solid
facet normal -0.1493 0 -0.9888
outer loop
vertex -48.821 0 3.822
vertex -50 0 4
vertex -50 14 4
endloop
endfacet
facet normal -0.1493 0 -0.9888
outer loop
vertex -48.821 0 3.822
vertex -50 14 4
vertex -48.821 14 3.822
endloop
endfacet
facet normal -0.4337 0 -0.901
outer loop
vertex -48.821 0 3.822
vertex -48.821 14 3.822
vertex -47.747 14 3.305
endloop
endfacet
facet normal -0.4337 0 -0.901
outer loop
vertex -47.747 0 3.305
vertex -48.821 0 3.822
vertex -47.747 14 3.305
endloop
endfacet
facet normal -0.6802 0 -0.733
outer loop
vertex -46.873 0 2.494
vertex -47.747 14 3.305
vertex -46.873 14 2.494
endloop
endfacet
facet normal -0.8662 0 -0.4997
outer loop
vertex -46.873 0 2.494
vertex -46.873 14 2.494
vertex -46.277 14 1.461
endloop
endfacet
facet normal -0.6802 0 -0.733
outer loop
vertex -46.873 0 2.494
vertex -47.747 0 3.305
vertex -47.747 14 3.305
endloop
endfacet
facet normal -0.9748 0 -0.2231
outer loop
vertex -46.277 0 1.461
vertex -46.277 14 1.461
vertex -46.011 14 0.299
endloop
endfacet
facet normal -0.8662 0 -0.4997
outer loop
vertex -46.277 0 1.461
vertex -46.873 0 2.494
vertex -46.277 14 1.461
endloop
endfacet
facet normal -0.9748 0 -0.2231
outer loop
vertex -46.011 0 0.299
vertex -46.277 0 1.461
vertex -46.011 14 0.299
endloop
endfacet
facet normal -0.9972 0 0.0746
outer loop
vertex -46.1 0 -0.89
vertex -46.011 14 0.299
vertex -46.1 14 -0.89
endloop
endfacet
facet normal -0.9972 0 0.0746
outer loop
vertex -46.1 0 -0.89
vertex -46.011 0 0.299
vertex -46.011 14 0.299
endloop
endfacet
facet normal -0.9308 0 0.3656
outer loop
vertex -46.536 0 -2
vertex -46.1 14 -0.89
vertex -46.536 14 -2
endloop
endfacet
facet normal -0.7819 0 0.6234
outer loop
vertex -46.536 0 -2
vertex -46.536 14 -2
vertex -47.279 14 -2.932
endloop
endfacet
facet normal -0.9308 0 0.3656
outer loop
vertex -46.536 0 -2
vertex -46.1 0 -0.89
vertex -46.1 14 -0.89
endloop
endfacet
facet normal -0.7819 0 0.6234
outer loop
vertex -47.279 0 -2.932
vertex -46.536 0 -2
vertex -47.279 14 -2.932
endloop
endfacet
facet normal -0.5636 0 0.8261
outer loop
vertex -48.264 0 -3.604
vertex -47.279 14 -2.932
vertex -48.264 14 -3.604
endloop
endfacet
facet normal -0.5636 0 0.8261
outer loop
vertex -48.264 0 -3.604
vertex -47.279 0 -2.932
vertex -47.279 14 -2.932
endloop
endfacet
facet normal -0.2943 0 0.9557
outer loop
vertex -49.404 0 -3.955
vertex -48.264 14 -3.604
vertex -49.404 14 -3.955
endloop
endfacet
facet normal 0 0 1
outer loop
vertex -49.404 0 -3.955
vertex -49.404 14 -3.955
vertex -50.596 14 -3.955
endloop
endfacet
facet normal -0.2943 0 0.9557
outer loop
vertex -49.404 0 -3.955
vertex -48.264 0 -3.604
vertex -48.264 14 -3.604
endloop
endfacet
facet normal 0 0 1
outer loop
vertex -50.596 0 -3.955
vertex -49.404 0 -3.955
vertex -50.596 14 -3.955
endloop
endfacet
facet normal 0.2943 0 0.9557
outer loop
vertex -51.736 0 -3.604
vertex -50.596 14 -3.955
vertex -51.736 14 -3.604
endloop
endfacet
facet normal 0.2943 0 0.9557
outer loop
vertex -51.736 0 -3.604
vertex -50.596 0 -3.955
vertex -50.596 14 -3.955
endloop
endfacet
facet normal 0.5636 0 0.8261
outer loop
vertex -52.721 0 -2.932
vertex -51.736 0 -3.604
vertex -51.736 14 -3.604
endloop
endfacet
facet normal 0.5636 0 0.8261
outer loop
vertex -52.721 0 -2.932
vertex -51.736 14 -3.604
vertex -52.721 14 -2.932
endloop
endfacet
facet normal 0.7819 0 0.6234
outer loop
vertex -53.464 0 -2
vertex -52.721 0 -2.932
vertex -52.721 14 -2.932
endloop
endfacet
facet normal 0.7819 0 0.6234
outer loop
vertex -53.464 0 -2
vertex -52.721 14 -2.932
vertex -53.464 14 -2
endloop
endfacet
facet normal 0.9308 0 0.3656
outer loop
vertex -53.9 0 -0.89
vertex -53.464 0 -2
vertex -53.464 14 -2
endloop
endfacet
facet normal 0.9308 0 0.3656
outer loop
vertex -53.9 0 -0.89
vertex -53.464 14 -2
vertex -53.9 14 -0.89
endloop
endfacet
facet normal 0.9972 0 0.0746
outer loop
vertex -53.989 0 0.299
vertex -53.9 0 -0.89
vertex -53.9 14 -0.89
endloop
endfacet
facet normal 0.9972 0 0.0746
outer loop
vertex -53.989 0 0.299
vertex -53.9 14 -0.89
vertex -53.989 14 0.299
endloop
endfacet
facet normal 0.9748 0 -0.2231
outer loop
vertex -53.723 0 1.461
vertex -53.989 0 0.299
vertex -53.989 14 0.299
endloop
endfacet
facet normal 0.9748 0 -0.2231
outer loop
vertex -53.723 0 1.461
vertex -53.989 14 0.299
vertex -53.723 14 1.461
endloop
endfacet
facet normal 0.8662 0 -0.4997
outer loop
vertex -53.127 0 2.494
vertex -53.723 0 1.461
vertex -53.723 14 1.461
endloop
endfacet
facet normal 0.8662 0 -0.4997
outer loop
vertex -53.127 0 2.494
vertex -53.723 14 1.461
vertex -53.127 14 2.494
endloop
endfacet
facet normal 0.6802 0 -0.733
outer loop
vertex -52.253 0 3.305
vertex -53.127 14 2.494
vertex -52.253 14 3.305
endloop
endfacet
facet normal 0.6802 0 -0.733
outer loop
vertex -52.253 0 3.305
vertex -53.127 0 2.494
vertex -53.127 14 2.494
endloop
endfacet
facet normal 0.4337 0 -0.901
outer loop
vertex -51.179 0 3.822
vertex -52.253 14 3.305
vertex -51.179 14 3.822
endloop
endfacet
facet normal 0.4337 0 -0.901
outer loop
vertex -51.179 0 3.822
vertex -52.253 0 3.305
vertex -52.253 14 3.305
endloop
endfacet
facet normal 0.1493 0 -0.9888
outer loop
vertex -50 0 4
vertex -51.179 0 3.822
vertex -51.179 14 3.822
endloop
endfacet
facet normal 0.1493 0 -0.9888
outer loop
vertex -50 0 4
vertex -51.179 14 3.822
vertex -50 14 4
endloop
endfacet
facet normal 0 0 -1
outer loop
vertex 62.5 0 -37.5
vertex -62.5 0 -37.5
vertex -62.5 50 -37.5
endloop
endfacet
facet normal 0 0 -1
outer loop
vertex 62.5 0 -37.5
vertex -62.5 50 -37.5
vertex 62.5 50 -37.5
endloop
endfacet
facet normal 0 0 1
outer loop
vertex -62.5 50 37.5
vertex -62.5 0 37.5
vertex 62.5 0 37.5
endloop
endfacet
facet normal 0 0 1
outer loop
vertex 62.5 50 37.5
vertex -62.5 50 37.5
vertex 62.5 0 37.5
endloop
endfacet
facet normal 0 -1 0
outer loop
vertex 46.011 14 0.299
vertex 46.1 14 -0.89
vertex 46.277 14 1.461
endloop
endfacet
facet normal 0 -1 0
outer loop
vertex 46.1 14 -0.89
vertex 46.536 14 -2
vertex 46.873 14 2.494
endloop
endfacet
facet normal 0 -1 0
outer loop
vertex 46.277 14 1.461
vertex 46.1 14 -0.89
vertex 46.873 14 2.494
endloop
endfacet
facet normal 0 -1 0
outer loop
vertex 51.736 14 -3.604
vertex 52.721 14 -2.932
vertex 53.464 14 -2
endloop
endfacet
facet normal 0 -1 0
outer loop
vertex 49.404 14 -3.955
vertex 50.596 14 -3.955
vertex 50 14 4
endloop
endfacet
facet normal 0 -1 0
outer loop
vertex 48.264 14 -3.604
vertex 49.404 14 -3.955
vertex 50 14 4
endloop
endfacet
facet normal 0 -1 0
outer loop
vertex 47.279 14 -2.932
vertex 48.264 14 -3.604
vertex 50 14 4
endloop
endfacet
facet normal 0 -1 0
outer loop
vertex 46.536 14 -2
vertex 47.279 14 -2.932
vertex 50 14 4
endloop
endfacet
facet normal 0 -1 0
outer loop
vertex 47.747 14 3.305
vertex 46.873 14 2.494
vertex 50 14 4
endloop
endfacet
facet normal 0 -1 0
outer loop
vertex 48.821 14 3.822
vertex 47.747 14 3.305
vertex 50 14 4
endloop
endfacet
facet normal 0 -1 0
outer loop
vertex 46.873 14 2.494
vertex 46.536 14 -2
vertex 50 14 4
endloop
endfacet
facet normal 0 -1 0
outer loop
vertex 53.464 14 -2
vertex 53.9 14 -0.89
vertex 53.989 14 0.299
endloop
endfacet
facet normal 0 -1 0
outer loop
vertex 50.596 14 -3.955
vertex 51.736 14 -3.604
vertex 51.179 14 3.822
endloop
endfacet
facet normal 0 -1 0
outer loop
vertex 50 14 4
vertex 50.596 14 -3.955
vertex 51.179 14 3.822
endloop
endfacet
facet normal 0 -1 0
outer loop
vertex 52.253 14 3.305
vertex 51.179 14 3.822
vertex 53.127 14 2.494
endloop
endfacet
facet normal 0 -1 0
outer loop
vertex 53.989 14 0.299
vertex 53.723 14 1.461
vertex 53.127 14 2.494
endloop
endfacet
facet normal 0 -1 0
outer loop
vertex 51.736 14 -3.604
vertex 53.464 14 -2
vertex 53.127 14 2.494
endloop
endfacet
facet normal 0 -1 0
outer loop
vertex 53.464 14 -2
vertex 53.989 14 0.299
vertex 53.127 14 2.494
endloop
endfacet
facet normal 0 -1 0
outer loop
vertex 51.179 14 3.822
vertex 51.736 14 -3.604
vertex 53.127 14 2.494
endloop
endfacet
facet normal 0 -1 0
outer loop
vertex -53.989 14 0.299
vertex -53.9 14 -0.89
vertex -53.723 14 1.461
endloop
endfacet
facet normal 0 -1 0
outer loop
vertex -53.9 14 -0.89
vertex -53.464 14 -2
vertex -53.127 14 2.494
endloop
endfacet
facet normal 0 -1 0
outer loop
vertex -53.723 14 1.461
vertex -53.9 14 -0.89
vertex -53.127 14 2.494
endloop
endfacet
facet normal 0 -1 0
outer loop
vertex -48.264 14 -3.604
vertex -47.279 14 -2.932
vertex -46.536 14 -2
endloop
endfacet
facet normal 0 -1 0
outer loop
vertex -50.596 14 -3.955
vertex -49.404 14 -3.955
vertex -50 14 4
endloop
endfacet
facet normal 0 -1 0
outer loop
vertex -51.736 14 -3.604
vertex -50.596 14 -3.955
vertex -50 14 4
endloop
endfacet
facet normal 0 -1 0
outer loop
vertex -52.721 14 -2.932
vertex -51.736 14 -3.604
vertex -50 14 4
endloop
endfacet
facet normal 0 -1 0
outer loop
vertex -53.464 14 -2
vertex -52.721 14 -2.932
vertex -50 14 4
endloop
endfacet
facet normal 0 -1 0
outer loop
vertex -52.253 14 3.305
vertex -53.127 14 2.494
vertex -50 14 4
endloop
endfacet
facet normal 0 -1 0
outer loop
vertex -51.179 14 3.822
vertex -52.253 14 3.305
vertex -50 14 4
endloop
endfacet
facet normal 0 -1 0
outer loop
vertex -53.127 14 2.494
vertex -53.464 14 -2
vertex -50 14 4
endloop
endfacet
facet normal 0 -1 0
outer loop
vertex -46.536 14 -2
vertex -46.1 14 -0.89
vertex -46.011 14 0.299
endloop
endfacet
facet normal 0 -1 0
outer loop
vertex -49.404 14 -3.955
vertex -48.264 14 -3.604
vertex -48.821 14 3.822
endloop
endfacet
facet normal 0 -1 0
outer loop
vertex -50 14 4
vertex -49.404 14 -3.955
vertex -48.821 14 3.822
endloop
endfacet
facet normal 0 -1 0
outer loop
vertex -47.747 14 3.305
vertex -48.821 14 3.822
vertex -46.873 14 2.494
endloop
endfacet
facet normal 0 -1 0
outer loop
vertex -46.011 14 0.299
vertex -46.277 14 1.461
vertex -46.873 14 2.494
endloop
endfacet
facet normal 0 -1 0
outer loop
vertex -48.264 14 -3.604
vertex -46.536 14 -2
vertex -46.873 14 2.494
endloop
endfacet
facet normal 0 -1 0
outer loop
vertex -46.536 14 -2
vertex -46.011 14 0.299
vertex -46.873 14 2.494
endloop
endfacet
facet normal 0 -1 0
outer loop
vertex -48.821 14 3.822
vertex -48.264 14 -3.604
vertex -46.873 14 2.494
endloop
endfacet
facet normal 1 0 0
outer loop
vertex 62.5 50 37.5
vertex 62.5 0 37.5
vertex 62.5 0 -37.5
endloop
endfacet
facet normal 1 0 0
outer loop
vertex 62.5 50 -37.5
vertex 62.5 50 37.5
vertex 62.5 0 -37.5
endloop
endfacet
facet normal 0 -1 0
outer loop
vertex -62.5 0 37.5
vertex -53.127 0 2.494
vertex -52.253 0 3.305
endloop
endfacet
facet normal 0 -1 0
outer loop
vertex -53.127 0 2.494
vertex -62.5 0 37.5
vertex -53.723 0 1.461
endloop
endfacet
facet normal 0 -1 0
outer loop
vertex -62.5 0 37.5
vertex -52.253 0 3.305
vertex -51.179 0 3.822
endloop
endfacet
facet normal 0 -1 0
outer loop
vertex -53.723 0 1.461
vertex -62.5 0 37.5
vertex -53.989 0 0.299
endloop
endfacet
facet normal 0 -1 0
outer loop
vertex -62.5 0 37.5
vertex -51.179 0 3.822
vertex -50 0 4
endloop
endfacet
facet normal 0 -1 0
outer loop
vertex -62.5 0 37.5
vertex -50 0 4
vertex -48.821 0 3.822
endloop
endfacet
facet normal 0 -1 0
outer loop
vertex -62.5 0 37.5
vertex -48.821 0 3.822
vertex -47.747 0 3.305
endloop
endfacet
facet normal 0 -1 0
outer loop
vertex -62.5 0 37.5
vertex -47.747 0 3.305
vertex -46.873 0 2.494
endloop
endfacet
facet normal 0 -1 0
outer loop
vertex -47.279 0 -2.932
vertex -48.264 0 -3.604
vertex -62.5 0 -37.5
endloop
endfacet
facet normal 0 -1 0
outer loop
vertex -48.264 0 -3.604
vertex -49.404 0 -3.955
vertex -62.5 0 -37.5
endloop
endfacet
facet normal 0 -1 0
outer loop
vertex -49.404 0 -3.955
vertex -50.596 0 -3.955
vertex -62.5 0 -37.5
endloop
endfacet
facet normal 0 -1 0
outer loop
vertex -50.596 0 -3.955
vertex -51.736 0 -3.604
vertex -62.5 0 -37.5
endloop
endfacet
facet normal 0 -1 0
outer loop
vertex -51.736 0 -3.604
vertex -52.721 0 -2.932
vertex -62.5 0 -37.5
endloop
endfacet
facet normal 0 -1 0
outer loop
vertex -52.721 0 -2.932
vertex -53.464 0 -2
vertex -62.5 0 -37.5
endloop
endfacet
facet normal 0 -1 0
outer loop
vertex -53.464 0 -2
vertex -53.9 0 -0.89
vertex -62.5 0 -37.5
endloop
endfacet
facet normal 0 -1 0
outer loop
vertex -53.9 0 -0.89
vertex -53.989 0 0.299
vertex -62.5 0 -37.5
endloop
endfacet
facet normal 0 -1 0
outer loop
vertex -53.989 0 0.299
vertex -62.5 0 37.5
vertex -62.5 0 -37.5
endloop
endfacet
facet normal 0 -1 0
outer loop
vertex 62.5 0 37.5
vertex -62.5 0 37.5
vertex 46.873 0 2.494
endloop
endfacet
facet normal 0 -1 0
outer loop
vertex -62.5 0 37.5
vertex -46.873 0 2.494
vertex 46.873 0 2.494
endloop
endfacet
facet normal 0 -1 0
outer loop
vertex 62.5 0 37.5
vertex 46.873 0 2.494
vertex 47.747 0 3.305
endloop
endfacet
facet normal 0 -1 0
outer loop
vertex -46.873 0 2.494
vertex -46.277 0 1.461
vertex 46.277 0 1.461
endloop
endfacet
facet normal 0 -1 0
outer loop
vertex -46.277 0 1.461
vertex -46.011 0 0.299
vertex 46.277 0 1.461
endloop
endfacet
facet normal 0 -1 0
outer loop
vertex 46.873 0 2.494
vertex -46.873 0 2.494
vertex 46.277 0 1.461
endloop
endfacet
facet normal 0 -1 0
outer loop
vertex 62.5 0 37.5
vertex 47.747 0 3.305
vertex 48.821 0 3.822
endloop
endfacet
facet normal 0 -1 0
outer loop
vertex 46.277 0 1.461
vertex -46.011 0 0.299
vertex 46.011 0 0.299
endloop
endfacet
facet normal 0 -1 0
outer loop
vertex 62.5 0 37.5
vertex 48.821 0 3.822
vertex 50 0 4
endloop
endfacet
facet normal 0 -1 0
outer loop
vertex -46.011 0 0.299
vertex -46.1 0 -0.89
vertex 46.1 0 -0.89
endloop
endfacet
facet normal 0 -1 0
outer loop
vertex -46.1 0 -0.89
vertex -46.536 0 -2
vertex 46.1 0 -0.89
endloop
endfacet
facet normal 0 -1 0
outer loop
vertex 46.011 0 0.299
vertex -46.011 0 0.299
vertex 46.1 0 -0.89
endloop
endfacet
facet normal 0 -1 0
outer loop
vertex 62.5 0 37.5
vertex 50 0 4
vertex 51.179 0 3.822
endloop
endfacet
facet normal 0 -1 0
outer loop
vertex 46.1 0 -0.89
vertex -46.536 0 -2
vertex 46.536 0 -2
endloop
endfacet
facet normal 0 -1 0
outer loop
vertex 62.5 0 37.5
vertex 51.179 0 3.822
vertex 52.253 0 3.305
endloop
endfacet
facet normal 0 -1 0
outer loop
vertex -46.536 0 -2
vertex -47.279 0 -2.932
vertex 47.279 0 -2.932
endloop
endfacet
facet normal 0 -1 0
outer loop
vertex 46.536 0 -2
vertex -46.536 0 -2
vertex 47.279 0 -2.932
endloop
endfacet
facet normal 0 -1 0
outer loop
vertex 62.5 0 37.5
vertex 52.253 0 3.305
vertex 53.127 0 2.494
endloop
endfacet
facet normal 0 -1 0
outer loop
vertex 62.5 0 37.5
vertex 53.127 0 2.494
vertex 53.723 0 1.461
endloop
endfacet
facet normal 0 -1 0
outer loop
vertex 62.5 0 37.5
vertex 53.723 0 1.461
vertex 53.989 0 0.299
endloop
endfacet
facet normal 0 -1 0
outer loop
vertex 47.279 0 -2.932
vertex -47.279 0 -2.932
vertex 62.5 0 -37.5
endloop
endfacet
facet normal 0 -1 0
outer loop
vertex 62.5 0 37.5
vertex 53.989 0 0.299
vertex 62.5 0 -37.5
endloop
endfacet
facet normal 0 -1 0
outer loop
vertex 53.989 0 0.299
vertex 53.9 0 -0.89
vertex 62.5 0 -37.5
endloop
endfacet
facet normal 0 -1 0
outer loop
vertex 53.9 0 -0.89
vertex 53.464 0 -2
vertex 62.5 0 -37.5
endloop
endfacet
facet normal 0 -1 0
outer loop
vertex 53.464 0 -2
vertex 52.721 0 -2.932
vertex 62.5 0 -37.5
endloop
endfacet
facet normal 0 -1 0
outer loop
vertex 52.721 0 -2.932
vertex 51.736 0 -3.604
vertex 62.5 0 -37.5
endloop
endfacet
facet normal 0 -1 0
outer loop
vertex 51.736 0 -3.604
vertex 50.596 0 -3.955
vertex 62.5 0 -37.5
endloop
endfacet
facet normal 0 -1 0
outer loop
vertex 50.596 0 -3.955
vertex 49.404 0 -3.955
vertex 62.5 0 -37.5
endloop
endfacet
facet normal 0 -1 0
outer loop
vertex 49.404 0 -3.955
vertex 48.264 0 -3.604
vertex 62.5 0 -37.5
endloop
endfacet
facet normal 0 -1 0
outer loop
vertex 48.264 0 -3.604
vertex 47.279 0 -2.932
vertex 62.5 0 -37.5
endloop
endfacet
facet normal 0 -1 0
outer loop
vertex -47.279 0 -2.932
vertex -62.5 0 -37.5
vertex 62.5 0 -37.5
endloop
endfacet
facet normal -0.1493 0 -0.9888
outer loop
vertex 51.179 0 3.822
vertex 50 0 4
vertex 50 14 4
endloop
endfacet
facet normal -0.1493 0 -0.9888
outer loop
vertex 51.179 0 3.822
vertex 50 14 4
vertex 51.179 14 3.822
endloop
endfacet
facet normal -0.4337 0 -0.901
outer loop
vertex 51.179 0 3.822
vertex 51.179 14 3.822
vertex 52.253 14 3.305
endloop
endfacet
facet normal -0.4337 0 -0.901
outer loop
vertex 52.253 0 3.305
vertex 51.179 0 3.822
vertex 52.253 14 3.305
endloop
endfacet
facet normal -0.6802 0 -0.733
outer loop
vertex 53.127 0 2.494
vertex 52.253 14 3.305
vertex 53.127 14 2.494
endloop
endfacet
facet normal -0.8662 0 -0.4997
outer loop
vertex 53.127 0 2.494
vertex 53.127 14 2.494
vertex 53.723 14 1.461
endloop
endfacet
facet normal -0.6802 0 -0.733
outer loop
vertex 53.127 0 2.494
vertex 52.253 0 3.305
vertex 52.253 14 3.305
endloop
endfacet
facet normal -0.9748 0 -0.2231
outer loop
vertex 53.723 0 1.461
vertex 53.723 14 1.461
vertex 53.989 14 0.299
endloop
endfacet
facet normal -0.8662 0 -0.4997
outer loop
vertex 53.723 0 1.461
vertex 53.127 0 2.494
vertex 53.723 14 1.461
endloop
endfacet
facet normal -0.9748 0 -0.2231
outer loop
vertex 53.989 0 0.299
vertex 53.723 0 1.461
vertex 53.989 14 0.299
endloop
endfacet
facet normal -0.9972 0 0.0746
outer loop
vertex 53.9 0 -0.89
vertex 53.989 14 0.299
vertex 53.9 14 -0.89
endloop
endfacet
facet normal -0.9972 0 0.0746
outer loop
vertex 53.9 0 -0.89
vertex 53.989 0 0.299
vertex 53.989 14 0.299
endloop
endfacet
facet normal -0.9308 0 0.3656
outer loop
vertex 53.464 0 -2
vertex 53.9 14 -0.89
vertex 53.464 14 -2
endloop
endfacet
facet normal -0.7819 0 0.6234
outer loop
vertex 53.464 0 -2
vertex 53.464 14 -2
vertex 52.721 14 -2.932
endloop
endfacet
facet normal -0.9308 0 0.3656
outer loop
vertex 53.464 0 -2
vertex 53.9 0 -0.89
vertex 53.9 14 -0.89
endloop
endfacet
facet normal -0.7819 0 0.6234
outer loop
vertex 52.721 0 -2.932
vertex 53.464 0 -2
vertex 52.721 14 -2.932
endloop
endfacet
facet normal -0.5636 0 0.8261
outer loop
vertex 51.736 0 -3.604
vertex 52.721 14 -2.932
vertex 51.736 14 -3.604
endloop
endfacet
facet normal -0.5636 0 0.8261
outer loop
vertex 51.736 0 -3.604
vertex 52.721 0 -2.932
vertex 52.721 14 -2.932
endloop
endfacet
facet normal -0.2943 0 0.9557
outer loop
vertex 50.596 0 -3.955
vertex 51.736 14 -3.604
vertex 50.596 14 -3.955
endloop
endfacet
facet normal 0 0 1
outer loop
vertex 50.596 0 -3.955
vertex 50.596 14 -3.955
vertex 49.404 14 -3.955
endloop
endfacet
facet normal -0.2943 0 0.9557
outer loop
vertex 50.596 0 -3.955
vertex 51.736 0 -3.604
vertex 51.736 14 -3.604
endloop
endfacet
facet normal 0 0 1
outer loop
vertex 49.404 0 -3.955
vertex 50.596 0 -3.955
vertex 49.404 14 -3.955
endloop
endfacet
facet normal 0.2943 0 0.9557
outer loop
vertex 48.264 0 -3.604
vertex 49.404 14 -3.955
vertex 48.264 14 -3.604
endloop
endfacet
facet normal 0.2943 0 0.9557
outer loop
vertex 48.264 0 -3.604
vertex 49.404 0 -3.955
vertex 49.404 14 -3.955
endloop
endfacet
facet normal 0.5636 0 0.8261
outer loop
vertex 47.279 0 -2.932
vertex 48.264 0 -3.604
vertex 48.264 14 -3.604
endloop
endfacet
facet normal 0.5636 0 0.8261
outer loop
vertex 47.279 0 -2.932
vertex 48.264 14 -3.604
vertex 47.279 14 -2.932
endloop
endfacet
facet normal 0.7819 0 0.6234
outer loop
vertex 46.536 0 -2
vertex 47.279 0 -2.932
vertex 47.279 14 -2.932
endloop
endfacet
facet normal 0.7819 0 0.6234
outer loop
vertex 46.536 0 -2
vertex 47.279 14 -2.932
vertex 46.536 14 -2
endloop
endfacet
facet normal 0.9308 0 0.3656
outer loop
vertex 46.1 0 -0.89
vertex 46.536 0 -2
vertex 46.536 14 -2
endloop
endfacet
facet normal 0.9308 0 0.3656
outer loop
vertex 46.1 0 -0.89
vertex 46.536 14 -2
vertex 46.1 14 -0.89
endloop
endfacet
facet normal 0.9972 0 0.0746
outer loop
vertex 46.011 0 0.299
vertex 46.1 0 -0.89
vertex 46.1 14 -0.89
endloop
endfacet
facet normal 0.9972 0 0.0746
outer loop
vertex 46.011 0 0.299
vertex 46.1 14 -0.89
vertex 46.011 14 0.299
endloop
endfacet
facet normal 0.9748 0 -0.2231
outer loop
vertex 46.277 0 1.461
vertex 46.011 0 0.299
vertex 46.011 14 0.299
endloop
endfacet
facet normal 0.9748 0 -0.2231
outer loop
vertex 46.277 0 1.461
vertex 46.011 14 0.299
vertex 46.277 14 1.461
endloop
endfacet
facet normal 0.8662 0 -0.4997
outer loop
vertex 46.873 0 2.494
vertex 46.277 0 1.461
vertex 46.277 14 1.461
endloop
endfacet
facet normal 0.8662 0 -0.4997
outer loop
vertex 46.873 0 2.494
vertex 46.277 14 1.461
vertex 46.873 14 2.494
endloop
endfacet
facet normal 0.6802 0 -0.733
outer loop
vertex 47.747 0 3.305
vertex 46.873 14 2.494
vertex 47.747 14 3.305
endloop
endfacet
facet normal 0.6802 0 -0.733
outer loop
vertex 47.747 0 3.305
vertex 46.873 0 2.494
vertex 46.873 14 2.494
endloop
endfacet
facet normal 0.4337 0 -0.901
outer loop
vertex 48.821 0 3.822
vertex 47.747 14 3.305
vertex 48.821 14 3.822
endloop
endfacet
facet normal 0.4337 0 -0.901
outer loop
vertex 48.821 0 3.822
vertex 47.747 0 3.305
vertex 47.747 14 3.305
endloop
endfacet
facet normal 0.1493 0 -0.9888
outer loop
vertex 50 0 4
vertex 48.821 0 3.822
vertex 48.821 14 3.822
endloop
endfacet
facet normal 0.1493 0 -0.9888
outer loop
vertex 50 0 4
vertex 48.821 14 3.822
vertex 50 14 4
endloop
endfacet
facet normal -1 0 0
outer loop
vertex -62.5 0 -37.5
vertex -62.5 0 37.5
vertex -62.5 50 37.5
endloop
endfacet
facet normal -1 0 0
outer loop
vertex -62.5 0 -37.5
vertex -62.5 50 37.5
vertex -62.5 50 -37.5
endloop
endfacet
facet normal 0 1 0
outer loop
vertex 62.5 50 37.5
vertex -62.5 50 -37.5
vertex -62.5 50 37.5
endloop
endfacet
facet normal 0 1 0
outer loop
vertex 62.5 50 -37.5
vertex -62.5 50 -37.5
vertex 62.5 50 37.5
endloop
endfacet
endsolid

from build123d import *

# Parameters (mm, degrees)
CROQUIS_BASE_W             = 125
CROQUIS_BASE_H             = 75
CAJA_BAJA_DEPTH            = 50
CROQUIS_AGUJEROS_MONTAJE_R = 4
AGUJERO_INSERTO_M6_DEPTH   = 14


with BuildPart() as part:
    # Croquis_base → Caja_baja (new body)
    with BuildSketch(Plane(origin=(0, 0, 0), x_dir=(1, 0, 0), z_dir=(0, 1, 0))):
        Rectangle(CROQUIS_BASE_W, CROQUIS_BASE_H)
    extrude(amount=CAJA_BAJA_DEPTH)

    # Croquis_agujeros_montaje → Agujero_inserto_M6 (cut)
    with BuildSketch(Plane(origin=(0, 0, 0), x_dir=(1, 0, 0), z_dir=(0, 1, 0))):
        with Locations(Location((-50, 0, 0), (0, 0, 270))):
            Circle(CROQUIS_AGUJEROS_MONTAJE_R)
        with Locations(Location((50, 0, 0), (0, 0, 270))):
            Circle(CROQUIS_AGUJEROS_MONTAJE_R)
    extrude(amount=AGUJERO_INSERTO_M6_DEPTH, mode=Mode.SUBTRACT)


solid = part.part
